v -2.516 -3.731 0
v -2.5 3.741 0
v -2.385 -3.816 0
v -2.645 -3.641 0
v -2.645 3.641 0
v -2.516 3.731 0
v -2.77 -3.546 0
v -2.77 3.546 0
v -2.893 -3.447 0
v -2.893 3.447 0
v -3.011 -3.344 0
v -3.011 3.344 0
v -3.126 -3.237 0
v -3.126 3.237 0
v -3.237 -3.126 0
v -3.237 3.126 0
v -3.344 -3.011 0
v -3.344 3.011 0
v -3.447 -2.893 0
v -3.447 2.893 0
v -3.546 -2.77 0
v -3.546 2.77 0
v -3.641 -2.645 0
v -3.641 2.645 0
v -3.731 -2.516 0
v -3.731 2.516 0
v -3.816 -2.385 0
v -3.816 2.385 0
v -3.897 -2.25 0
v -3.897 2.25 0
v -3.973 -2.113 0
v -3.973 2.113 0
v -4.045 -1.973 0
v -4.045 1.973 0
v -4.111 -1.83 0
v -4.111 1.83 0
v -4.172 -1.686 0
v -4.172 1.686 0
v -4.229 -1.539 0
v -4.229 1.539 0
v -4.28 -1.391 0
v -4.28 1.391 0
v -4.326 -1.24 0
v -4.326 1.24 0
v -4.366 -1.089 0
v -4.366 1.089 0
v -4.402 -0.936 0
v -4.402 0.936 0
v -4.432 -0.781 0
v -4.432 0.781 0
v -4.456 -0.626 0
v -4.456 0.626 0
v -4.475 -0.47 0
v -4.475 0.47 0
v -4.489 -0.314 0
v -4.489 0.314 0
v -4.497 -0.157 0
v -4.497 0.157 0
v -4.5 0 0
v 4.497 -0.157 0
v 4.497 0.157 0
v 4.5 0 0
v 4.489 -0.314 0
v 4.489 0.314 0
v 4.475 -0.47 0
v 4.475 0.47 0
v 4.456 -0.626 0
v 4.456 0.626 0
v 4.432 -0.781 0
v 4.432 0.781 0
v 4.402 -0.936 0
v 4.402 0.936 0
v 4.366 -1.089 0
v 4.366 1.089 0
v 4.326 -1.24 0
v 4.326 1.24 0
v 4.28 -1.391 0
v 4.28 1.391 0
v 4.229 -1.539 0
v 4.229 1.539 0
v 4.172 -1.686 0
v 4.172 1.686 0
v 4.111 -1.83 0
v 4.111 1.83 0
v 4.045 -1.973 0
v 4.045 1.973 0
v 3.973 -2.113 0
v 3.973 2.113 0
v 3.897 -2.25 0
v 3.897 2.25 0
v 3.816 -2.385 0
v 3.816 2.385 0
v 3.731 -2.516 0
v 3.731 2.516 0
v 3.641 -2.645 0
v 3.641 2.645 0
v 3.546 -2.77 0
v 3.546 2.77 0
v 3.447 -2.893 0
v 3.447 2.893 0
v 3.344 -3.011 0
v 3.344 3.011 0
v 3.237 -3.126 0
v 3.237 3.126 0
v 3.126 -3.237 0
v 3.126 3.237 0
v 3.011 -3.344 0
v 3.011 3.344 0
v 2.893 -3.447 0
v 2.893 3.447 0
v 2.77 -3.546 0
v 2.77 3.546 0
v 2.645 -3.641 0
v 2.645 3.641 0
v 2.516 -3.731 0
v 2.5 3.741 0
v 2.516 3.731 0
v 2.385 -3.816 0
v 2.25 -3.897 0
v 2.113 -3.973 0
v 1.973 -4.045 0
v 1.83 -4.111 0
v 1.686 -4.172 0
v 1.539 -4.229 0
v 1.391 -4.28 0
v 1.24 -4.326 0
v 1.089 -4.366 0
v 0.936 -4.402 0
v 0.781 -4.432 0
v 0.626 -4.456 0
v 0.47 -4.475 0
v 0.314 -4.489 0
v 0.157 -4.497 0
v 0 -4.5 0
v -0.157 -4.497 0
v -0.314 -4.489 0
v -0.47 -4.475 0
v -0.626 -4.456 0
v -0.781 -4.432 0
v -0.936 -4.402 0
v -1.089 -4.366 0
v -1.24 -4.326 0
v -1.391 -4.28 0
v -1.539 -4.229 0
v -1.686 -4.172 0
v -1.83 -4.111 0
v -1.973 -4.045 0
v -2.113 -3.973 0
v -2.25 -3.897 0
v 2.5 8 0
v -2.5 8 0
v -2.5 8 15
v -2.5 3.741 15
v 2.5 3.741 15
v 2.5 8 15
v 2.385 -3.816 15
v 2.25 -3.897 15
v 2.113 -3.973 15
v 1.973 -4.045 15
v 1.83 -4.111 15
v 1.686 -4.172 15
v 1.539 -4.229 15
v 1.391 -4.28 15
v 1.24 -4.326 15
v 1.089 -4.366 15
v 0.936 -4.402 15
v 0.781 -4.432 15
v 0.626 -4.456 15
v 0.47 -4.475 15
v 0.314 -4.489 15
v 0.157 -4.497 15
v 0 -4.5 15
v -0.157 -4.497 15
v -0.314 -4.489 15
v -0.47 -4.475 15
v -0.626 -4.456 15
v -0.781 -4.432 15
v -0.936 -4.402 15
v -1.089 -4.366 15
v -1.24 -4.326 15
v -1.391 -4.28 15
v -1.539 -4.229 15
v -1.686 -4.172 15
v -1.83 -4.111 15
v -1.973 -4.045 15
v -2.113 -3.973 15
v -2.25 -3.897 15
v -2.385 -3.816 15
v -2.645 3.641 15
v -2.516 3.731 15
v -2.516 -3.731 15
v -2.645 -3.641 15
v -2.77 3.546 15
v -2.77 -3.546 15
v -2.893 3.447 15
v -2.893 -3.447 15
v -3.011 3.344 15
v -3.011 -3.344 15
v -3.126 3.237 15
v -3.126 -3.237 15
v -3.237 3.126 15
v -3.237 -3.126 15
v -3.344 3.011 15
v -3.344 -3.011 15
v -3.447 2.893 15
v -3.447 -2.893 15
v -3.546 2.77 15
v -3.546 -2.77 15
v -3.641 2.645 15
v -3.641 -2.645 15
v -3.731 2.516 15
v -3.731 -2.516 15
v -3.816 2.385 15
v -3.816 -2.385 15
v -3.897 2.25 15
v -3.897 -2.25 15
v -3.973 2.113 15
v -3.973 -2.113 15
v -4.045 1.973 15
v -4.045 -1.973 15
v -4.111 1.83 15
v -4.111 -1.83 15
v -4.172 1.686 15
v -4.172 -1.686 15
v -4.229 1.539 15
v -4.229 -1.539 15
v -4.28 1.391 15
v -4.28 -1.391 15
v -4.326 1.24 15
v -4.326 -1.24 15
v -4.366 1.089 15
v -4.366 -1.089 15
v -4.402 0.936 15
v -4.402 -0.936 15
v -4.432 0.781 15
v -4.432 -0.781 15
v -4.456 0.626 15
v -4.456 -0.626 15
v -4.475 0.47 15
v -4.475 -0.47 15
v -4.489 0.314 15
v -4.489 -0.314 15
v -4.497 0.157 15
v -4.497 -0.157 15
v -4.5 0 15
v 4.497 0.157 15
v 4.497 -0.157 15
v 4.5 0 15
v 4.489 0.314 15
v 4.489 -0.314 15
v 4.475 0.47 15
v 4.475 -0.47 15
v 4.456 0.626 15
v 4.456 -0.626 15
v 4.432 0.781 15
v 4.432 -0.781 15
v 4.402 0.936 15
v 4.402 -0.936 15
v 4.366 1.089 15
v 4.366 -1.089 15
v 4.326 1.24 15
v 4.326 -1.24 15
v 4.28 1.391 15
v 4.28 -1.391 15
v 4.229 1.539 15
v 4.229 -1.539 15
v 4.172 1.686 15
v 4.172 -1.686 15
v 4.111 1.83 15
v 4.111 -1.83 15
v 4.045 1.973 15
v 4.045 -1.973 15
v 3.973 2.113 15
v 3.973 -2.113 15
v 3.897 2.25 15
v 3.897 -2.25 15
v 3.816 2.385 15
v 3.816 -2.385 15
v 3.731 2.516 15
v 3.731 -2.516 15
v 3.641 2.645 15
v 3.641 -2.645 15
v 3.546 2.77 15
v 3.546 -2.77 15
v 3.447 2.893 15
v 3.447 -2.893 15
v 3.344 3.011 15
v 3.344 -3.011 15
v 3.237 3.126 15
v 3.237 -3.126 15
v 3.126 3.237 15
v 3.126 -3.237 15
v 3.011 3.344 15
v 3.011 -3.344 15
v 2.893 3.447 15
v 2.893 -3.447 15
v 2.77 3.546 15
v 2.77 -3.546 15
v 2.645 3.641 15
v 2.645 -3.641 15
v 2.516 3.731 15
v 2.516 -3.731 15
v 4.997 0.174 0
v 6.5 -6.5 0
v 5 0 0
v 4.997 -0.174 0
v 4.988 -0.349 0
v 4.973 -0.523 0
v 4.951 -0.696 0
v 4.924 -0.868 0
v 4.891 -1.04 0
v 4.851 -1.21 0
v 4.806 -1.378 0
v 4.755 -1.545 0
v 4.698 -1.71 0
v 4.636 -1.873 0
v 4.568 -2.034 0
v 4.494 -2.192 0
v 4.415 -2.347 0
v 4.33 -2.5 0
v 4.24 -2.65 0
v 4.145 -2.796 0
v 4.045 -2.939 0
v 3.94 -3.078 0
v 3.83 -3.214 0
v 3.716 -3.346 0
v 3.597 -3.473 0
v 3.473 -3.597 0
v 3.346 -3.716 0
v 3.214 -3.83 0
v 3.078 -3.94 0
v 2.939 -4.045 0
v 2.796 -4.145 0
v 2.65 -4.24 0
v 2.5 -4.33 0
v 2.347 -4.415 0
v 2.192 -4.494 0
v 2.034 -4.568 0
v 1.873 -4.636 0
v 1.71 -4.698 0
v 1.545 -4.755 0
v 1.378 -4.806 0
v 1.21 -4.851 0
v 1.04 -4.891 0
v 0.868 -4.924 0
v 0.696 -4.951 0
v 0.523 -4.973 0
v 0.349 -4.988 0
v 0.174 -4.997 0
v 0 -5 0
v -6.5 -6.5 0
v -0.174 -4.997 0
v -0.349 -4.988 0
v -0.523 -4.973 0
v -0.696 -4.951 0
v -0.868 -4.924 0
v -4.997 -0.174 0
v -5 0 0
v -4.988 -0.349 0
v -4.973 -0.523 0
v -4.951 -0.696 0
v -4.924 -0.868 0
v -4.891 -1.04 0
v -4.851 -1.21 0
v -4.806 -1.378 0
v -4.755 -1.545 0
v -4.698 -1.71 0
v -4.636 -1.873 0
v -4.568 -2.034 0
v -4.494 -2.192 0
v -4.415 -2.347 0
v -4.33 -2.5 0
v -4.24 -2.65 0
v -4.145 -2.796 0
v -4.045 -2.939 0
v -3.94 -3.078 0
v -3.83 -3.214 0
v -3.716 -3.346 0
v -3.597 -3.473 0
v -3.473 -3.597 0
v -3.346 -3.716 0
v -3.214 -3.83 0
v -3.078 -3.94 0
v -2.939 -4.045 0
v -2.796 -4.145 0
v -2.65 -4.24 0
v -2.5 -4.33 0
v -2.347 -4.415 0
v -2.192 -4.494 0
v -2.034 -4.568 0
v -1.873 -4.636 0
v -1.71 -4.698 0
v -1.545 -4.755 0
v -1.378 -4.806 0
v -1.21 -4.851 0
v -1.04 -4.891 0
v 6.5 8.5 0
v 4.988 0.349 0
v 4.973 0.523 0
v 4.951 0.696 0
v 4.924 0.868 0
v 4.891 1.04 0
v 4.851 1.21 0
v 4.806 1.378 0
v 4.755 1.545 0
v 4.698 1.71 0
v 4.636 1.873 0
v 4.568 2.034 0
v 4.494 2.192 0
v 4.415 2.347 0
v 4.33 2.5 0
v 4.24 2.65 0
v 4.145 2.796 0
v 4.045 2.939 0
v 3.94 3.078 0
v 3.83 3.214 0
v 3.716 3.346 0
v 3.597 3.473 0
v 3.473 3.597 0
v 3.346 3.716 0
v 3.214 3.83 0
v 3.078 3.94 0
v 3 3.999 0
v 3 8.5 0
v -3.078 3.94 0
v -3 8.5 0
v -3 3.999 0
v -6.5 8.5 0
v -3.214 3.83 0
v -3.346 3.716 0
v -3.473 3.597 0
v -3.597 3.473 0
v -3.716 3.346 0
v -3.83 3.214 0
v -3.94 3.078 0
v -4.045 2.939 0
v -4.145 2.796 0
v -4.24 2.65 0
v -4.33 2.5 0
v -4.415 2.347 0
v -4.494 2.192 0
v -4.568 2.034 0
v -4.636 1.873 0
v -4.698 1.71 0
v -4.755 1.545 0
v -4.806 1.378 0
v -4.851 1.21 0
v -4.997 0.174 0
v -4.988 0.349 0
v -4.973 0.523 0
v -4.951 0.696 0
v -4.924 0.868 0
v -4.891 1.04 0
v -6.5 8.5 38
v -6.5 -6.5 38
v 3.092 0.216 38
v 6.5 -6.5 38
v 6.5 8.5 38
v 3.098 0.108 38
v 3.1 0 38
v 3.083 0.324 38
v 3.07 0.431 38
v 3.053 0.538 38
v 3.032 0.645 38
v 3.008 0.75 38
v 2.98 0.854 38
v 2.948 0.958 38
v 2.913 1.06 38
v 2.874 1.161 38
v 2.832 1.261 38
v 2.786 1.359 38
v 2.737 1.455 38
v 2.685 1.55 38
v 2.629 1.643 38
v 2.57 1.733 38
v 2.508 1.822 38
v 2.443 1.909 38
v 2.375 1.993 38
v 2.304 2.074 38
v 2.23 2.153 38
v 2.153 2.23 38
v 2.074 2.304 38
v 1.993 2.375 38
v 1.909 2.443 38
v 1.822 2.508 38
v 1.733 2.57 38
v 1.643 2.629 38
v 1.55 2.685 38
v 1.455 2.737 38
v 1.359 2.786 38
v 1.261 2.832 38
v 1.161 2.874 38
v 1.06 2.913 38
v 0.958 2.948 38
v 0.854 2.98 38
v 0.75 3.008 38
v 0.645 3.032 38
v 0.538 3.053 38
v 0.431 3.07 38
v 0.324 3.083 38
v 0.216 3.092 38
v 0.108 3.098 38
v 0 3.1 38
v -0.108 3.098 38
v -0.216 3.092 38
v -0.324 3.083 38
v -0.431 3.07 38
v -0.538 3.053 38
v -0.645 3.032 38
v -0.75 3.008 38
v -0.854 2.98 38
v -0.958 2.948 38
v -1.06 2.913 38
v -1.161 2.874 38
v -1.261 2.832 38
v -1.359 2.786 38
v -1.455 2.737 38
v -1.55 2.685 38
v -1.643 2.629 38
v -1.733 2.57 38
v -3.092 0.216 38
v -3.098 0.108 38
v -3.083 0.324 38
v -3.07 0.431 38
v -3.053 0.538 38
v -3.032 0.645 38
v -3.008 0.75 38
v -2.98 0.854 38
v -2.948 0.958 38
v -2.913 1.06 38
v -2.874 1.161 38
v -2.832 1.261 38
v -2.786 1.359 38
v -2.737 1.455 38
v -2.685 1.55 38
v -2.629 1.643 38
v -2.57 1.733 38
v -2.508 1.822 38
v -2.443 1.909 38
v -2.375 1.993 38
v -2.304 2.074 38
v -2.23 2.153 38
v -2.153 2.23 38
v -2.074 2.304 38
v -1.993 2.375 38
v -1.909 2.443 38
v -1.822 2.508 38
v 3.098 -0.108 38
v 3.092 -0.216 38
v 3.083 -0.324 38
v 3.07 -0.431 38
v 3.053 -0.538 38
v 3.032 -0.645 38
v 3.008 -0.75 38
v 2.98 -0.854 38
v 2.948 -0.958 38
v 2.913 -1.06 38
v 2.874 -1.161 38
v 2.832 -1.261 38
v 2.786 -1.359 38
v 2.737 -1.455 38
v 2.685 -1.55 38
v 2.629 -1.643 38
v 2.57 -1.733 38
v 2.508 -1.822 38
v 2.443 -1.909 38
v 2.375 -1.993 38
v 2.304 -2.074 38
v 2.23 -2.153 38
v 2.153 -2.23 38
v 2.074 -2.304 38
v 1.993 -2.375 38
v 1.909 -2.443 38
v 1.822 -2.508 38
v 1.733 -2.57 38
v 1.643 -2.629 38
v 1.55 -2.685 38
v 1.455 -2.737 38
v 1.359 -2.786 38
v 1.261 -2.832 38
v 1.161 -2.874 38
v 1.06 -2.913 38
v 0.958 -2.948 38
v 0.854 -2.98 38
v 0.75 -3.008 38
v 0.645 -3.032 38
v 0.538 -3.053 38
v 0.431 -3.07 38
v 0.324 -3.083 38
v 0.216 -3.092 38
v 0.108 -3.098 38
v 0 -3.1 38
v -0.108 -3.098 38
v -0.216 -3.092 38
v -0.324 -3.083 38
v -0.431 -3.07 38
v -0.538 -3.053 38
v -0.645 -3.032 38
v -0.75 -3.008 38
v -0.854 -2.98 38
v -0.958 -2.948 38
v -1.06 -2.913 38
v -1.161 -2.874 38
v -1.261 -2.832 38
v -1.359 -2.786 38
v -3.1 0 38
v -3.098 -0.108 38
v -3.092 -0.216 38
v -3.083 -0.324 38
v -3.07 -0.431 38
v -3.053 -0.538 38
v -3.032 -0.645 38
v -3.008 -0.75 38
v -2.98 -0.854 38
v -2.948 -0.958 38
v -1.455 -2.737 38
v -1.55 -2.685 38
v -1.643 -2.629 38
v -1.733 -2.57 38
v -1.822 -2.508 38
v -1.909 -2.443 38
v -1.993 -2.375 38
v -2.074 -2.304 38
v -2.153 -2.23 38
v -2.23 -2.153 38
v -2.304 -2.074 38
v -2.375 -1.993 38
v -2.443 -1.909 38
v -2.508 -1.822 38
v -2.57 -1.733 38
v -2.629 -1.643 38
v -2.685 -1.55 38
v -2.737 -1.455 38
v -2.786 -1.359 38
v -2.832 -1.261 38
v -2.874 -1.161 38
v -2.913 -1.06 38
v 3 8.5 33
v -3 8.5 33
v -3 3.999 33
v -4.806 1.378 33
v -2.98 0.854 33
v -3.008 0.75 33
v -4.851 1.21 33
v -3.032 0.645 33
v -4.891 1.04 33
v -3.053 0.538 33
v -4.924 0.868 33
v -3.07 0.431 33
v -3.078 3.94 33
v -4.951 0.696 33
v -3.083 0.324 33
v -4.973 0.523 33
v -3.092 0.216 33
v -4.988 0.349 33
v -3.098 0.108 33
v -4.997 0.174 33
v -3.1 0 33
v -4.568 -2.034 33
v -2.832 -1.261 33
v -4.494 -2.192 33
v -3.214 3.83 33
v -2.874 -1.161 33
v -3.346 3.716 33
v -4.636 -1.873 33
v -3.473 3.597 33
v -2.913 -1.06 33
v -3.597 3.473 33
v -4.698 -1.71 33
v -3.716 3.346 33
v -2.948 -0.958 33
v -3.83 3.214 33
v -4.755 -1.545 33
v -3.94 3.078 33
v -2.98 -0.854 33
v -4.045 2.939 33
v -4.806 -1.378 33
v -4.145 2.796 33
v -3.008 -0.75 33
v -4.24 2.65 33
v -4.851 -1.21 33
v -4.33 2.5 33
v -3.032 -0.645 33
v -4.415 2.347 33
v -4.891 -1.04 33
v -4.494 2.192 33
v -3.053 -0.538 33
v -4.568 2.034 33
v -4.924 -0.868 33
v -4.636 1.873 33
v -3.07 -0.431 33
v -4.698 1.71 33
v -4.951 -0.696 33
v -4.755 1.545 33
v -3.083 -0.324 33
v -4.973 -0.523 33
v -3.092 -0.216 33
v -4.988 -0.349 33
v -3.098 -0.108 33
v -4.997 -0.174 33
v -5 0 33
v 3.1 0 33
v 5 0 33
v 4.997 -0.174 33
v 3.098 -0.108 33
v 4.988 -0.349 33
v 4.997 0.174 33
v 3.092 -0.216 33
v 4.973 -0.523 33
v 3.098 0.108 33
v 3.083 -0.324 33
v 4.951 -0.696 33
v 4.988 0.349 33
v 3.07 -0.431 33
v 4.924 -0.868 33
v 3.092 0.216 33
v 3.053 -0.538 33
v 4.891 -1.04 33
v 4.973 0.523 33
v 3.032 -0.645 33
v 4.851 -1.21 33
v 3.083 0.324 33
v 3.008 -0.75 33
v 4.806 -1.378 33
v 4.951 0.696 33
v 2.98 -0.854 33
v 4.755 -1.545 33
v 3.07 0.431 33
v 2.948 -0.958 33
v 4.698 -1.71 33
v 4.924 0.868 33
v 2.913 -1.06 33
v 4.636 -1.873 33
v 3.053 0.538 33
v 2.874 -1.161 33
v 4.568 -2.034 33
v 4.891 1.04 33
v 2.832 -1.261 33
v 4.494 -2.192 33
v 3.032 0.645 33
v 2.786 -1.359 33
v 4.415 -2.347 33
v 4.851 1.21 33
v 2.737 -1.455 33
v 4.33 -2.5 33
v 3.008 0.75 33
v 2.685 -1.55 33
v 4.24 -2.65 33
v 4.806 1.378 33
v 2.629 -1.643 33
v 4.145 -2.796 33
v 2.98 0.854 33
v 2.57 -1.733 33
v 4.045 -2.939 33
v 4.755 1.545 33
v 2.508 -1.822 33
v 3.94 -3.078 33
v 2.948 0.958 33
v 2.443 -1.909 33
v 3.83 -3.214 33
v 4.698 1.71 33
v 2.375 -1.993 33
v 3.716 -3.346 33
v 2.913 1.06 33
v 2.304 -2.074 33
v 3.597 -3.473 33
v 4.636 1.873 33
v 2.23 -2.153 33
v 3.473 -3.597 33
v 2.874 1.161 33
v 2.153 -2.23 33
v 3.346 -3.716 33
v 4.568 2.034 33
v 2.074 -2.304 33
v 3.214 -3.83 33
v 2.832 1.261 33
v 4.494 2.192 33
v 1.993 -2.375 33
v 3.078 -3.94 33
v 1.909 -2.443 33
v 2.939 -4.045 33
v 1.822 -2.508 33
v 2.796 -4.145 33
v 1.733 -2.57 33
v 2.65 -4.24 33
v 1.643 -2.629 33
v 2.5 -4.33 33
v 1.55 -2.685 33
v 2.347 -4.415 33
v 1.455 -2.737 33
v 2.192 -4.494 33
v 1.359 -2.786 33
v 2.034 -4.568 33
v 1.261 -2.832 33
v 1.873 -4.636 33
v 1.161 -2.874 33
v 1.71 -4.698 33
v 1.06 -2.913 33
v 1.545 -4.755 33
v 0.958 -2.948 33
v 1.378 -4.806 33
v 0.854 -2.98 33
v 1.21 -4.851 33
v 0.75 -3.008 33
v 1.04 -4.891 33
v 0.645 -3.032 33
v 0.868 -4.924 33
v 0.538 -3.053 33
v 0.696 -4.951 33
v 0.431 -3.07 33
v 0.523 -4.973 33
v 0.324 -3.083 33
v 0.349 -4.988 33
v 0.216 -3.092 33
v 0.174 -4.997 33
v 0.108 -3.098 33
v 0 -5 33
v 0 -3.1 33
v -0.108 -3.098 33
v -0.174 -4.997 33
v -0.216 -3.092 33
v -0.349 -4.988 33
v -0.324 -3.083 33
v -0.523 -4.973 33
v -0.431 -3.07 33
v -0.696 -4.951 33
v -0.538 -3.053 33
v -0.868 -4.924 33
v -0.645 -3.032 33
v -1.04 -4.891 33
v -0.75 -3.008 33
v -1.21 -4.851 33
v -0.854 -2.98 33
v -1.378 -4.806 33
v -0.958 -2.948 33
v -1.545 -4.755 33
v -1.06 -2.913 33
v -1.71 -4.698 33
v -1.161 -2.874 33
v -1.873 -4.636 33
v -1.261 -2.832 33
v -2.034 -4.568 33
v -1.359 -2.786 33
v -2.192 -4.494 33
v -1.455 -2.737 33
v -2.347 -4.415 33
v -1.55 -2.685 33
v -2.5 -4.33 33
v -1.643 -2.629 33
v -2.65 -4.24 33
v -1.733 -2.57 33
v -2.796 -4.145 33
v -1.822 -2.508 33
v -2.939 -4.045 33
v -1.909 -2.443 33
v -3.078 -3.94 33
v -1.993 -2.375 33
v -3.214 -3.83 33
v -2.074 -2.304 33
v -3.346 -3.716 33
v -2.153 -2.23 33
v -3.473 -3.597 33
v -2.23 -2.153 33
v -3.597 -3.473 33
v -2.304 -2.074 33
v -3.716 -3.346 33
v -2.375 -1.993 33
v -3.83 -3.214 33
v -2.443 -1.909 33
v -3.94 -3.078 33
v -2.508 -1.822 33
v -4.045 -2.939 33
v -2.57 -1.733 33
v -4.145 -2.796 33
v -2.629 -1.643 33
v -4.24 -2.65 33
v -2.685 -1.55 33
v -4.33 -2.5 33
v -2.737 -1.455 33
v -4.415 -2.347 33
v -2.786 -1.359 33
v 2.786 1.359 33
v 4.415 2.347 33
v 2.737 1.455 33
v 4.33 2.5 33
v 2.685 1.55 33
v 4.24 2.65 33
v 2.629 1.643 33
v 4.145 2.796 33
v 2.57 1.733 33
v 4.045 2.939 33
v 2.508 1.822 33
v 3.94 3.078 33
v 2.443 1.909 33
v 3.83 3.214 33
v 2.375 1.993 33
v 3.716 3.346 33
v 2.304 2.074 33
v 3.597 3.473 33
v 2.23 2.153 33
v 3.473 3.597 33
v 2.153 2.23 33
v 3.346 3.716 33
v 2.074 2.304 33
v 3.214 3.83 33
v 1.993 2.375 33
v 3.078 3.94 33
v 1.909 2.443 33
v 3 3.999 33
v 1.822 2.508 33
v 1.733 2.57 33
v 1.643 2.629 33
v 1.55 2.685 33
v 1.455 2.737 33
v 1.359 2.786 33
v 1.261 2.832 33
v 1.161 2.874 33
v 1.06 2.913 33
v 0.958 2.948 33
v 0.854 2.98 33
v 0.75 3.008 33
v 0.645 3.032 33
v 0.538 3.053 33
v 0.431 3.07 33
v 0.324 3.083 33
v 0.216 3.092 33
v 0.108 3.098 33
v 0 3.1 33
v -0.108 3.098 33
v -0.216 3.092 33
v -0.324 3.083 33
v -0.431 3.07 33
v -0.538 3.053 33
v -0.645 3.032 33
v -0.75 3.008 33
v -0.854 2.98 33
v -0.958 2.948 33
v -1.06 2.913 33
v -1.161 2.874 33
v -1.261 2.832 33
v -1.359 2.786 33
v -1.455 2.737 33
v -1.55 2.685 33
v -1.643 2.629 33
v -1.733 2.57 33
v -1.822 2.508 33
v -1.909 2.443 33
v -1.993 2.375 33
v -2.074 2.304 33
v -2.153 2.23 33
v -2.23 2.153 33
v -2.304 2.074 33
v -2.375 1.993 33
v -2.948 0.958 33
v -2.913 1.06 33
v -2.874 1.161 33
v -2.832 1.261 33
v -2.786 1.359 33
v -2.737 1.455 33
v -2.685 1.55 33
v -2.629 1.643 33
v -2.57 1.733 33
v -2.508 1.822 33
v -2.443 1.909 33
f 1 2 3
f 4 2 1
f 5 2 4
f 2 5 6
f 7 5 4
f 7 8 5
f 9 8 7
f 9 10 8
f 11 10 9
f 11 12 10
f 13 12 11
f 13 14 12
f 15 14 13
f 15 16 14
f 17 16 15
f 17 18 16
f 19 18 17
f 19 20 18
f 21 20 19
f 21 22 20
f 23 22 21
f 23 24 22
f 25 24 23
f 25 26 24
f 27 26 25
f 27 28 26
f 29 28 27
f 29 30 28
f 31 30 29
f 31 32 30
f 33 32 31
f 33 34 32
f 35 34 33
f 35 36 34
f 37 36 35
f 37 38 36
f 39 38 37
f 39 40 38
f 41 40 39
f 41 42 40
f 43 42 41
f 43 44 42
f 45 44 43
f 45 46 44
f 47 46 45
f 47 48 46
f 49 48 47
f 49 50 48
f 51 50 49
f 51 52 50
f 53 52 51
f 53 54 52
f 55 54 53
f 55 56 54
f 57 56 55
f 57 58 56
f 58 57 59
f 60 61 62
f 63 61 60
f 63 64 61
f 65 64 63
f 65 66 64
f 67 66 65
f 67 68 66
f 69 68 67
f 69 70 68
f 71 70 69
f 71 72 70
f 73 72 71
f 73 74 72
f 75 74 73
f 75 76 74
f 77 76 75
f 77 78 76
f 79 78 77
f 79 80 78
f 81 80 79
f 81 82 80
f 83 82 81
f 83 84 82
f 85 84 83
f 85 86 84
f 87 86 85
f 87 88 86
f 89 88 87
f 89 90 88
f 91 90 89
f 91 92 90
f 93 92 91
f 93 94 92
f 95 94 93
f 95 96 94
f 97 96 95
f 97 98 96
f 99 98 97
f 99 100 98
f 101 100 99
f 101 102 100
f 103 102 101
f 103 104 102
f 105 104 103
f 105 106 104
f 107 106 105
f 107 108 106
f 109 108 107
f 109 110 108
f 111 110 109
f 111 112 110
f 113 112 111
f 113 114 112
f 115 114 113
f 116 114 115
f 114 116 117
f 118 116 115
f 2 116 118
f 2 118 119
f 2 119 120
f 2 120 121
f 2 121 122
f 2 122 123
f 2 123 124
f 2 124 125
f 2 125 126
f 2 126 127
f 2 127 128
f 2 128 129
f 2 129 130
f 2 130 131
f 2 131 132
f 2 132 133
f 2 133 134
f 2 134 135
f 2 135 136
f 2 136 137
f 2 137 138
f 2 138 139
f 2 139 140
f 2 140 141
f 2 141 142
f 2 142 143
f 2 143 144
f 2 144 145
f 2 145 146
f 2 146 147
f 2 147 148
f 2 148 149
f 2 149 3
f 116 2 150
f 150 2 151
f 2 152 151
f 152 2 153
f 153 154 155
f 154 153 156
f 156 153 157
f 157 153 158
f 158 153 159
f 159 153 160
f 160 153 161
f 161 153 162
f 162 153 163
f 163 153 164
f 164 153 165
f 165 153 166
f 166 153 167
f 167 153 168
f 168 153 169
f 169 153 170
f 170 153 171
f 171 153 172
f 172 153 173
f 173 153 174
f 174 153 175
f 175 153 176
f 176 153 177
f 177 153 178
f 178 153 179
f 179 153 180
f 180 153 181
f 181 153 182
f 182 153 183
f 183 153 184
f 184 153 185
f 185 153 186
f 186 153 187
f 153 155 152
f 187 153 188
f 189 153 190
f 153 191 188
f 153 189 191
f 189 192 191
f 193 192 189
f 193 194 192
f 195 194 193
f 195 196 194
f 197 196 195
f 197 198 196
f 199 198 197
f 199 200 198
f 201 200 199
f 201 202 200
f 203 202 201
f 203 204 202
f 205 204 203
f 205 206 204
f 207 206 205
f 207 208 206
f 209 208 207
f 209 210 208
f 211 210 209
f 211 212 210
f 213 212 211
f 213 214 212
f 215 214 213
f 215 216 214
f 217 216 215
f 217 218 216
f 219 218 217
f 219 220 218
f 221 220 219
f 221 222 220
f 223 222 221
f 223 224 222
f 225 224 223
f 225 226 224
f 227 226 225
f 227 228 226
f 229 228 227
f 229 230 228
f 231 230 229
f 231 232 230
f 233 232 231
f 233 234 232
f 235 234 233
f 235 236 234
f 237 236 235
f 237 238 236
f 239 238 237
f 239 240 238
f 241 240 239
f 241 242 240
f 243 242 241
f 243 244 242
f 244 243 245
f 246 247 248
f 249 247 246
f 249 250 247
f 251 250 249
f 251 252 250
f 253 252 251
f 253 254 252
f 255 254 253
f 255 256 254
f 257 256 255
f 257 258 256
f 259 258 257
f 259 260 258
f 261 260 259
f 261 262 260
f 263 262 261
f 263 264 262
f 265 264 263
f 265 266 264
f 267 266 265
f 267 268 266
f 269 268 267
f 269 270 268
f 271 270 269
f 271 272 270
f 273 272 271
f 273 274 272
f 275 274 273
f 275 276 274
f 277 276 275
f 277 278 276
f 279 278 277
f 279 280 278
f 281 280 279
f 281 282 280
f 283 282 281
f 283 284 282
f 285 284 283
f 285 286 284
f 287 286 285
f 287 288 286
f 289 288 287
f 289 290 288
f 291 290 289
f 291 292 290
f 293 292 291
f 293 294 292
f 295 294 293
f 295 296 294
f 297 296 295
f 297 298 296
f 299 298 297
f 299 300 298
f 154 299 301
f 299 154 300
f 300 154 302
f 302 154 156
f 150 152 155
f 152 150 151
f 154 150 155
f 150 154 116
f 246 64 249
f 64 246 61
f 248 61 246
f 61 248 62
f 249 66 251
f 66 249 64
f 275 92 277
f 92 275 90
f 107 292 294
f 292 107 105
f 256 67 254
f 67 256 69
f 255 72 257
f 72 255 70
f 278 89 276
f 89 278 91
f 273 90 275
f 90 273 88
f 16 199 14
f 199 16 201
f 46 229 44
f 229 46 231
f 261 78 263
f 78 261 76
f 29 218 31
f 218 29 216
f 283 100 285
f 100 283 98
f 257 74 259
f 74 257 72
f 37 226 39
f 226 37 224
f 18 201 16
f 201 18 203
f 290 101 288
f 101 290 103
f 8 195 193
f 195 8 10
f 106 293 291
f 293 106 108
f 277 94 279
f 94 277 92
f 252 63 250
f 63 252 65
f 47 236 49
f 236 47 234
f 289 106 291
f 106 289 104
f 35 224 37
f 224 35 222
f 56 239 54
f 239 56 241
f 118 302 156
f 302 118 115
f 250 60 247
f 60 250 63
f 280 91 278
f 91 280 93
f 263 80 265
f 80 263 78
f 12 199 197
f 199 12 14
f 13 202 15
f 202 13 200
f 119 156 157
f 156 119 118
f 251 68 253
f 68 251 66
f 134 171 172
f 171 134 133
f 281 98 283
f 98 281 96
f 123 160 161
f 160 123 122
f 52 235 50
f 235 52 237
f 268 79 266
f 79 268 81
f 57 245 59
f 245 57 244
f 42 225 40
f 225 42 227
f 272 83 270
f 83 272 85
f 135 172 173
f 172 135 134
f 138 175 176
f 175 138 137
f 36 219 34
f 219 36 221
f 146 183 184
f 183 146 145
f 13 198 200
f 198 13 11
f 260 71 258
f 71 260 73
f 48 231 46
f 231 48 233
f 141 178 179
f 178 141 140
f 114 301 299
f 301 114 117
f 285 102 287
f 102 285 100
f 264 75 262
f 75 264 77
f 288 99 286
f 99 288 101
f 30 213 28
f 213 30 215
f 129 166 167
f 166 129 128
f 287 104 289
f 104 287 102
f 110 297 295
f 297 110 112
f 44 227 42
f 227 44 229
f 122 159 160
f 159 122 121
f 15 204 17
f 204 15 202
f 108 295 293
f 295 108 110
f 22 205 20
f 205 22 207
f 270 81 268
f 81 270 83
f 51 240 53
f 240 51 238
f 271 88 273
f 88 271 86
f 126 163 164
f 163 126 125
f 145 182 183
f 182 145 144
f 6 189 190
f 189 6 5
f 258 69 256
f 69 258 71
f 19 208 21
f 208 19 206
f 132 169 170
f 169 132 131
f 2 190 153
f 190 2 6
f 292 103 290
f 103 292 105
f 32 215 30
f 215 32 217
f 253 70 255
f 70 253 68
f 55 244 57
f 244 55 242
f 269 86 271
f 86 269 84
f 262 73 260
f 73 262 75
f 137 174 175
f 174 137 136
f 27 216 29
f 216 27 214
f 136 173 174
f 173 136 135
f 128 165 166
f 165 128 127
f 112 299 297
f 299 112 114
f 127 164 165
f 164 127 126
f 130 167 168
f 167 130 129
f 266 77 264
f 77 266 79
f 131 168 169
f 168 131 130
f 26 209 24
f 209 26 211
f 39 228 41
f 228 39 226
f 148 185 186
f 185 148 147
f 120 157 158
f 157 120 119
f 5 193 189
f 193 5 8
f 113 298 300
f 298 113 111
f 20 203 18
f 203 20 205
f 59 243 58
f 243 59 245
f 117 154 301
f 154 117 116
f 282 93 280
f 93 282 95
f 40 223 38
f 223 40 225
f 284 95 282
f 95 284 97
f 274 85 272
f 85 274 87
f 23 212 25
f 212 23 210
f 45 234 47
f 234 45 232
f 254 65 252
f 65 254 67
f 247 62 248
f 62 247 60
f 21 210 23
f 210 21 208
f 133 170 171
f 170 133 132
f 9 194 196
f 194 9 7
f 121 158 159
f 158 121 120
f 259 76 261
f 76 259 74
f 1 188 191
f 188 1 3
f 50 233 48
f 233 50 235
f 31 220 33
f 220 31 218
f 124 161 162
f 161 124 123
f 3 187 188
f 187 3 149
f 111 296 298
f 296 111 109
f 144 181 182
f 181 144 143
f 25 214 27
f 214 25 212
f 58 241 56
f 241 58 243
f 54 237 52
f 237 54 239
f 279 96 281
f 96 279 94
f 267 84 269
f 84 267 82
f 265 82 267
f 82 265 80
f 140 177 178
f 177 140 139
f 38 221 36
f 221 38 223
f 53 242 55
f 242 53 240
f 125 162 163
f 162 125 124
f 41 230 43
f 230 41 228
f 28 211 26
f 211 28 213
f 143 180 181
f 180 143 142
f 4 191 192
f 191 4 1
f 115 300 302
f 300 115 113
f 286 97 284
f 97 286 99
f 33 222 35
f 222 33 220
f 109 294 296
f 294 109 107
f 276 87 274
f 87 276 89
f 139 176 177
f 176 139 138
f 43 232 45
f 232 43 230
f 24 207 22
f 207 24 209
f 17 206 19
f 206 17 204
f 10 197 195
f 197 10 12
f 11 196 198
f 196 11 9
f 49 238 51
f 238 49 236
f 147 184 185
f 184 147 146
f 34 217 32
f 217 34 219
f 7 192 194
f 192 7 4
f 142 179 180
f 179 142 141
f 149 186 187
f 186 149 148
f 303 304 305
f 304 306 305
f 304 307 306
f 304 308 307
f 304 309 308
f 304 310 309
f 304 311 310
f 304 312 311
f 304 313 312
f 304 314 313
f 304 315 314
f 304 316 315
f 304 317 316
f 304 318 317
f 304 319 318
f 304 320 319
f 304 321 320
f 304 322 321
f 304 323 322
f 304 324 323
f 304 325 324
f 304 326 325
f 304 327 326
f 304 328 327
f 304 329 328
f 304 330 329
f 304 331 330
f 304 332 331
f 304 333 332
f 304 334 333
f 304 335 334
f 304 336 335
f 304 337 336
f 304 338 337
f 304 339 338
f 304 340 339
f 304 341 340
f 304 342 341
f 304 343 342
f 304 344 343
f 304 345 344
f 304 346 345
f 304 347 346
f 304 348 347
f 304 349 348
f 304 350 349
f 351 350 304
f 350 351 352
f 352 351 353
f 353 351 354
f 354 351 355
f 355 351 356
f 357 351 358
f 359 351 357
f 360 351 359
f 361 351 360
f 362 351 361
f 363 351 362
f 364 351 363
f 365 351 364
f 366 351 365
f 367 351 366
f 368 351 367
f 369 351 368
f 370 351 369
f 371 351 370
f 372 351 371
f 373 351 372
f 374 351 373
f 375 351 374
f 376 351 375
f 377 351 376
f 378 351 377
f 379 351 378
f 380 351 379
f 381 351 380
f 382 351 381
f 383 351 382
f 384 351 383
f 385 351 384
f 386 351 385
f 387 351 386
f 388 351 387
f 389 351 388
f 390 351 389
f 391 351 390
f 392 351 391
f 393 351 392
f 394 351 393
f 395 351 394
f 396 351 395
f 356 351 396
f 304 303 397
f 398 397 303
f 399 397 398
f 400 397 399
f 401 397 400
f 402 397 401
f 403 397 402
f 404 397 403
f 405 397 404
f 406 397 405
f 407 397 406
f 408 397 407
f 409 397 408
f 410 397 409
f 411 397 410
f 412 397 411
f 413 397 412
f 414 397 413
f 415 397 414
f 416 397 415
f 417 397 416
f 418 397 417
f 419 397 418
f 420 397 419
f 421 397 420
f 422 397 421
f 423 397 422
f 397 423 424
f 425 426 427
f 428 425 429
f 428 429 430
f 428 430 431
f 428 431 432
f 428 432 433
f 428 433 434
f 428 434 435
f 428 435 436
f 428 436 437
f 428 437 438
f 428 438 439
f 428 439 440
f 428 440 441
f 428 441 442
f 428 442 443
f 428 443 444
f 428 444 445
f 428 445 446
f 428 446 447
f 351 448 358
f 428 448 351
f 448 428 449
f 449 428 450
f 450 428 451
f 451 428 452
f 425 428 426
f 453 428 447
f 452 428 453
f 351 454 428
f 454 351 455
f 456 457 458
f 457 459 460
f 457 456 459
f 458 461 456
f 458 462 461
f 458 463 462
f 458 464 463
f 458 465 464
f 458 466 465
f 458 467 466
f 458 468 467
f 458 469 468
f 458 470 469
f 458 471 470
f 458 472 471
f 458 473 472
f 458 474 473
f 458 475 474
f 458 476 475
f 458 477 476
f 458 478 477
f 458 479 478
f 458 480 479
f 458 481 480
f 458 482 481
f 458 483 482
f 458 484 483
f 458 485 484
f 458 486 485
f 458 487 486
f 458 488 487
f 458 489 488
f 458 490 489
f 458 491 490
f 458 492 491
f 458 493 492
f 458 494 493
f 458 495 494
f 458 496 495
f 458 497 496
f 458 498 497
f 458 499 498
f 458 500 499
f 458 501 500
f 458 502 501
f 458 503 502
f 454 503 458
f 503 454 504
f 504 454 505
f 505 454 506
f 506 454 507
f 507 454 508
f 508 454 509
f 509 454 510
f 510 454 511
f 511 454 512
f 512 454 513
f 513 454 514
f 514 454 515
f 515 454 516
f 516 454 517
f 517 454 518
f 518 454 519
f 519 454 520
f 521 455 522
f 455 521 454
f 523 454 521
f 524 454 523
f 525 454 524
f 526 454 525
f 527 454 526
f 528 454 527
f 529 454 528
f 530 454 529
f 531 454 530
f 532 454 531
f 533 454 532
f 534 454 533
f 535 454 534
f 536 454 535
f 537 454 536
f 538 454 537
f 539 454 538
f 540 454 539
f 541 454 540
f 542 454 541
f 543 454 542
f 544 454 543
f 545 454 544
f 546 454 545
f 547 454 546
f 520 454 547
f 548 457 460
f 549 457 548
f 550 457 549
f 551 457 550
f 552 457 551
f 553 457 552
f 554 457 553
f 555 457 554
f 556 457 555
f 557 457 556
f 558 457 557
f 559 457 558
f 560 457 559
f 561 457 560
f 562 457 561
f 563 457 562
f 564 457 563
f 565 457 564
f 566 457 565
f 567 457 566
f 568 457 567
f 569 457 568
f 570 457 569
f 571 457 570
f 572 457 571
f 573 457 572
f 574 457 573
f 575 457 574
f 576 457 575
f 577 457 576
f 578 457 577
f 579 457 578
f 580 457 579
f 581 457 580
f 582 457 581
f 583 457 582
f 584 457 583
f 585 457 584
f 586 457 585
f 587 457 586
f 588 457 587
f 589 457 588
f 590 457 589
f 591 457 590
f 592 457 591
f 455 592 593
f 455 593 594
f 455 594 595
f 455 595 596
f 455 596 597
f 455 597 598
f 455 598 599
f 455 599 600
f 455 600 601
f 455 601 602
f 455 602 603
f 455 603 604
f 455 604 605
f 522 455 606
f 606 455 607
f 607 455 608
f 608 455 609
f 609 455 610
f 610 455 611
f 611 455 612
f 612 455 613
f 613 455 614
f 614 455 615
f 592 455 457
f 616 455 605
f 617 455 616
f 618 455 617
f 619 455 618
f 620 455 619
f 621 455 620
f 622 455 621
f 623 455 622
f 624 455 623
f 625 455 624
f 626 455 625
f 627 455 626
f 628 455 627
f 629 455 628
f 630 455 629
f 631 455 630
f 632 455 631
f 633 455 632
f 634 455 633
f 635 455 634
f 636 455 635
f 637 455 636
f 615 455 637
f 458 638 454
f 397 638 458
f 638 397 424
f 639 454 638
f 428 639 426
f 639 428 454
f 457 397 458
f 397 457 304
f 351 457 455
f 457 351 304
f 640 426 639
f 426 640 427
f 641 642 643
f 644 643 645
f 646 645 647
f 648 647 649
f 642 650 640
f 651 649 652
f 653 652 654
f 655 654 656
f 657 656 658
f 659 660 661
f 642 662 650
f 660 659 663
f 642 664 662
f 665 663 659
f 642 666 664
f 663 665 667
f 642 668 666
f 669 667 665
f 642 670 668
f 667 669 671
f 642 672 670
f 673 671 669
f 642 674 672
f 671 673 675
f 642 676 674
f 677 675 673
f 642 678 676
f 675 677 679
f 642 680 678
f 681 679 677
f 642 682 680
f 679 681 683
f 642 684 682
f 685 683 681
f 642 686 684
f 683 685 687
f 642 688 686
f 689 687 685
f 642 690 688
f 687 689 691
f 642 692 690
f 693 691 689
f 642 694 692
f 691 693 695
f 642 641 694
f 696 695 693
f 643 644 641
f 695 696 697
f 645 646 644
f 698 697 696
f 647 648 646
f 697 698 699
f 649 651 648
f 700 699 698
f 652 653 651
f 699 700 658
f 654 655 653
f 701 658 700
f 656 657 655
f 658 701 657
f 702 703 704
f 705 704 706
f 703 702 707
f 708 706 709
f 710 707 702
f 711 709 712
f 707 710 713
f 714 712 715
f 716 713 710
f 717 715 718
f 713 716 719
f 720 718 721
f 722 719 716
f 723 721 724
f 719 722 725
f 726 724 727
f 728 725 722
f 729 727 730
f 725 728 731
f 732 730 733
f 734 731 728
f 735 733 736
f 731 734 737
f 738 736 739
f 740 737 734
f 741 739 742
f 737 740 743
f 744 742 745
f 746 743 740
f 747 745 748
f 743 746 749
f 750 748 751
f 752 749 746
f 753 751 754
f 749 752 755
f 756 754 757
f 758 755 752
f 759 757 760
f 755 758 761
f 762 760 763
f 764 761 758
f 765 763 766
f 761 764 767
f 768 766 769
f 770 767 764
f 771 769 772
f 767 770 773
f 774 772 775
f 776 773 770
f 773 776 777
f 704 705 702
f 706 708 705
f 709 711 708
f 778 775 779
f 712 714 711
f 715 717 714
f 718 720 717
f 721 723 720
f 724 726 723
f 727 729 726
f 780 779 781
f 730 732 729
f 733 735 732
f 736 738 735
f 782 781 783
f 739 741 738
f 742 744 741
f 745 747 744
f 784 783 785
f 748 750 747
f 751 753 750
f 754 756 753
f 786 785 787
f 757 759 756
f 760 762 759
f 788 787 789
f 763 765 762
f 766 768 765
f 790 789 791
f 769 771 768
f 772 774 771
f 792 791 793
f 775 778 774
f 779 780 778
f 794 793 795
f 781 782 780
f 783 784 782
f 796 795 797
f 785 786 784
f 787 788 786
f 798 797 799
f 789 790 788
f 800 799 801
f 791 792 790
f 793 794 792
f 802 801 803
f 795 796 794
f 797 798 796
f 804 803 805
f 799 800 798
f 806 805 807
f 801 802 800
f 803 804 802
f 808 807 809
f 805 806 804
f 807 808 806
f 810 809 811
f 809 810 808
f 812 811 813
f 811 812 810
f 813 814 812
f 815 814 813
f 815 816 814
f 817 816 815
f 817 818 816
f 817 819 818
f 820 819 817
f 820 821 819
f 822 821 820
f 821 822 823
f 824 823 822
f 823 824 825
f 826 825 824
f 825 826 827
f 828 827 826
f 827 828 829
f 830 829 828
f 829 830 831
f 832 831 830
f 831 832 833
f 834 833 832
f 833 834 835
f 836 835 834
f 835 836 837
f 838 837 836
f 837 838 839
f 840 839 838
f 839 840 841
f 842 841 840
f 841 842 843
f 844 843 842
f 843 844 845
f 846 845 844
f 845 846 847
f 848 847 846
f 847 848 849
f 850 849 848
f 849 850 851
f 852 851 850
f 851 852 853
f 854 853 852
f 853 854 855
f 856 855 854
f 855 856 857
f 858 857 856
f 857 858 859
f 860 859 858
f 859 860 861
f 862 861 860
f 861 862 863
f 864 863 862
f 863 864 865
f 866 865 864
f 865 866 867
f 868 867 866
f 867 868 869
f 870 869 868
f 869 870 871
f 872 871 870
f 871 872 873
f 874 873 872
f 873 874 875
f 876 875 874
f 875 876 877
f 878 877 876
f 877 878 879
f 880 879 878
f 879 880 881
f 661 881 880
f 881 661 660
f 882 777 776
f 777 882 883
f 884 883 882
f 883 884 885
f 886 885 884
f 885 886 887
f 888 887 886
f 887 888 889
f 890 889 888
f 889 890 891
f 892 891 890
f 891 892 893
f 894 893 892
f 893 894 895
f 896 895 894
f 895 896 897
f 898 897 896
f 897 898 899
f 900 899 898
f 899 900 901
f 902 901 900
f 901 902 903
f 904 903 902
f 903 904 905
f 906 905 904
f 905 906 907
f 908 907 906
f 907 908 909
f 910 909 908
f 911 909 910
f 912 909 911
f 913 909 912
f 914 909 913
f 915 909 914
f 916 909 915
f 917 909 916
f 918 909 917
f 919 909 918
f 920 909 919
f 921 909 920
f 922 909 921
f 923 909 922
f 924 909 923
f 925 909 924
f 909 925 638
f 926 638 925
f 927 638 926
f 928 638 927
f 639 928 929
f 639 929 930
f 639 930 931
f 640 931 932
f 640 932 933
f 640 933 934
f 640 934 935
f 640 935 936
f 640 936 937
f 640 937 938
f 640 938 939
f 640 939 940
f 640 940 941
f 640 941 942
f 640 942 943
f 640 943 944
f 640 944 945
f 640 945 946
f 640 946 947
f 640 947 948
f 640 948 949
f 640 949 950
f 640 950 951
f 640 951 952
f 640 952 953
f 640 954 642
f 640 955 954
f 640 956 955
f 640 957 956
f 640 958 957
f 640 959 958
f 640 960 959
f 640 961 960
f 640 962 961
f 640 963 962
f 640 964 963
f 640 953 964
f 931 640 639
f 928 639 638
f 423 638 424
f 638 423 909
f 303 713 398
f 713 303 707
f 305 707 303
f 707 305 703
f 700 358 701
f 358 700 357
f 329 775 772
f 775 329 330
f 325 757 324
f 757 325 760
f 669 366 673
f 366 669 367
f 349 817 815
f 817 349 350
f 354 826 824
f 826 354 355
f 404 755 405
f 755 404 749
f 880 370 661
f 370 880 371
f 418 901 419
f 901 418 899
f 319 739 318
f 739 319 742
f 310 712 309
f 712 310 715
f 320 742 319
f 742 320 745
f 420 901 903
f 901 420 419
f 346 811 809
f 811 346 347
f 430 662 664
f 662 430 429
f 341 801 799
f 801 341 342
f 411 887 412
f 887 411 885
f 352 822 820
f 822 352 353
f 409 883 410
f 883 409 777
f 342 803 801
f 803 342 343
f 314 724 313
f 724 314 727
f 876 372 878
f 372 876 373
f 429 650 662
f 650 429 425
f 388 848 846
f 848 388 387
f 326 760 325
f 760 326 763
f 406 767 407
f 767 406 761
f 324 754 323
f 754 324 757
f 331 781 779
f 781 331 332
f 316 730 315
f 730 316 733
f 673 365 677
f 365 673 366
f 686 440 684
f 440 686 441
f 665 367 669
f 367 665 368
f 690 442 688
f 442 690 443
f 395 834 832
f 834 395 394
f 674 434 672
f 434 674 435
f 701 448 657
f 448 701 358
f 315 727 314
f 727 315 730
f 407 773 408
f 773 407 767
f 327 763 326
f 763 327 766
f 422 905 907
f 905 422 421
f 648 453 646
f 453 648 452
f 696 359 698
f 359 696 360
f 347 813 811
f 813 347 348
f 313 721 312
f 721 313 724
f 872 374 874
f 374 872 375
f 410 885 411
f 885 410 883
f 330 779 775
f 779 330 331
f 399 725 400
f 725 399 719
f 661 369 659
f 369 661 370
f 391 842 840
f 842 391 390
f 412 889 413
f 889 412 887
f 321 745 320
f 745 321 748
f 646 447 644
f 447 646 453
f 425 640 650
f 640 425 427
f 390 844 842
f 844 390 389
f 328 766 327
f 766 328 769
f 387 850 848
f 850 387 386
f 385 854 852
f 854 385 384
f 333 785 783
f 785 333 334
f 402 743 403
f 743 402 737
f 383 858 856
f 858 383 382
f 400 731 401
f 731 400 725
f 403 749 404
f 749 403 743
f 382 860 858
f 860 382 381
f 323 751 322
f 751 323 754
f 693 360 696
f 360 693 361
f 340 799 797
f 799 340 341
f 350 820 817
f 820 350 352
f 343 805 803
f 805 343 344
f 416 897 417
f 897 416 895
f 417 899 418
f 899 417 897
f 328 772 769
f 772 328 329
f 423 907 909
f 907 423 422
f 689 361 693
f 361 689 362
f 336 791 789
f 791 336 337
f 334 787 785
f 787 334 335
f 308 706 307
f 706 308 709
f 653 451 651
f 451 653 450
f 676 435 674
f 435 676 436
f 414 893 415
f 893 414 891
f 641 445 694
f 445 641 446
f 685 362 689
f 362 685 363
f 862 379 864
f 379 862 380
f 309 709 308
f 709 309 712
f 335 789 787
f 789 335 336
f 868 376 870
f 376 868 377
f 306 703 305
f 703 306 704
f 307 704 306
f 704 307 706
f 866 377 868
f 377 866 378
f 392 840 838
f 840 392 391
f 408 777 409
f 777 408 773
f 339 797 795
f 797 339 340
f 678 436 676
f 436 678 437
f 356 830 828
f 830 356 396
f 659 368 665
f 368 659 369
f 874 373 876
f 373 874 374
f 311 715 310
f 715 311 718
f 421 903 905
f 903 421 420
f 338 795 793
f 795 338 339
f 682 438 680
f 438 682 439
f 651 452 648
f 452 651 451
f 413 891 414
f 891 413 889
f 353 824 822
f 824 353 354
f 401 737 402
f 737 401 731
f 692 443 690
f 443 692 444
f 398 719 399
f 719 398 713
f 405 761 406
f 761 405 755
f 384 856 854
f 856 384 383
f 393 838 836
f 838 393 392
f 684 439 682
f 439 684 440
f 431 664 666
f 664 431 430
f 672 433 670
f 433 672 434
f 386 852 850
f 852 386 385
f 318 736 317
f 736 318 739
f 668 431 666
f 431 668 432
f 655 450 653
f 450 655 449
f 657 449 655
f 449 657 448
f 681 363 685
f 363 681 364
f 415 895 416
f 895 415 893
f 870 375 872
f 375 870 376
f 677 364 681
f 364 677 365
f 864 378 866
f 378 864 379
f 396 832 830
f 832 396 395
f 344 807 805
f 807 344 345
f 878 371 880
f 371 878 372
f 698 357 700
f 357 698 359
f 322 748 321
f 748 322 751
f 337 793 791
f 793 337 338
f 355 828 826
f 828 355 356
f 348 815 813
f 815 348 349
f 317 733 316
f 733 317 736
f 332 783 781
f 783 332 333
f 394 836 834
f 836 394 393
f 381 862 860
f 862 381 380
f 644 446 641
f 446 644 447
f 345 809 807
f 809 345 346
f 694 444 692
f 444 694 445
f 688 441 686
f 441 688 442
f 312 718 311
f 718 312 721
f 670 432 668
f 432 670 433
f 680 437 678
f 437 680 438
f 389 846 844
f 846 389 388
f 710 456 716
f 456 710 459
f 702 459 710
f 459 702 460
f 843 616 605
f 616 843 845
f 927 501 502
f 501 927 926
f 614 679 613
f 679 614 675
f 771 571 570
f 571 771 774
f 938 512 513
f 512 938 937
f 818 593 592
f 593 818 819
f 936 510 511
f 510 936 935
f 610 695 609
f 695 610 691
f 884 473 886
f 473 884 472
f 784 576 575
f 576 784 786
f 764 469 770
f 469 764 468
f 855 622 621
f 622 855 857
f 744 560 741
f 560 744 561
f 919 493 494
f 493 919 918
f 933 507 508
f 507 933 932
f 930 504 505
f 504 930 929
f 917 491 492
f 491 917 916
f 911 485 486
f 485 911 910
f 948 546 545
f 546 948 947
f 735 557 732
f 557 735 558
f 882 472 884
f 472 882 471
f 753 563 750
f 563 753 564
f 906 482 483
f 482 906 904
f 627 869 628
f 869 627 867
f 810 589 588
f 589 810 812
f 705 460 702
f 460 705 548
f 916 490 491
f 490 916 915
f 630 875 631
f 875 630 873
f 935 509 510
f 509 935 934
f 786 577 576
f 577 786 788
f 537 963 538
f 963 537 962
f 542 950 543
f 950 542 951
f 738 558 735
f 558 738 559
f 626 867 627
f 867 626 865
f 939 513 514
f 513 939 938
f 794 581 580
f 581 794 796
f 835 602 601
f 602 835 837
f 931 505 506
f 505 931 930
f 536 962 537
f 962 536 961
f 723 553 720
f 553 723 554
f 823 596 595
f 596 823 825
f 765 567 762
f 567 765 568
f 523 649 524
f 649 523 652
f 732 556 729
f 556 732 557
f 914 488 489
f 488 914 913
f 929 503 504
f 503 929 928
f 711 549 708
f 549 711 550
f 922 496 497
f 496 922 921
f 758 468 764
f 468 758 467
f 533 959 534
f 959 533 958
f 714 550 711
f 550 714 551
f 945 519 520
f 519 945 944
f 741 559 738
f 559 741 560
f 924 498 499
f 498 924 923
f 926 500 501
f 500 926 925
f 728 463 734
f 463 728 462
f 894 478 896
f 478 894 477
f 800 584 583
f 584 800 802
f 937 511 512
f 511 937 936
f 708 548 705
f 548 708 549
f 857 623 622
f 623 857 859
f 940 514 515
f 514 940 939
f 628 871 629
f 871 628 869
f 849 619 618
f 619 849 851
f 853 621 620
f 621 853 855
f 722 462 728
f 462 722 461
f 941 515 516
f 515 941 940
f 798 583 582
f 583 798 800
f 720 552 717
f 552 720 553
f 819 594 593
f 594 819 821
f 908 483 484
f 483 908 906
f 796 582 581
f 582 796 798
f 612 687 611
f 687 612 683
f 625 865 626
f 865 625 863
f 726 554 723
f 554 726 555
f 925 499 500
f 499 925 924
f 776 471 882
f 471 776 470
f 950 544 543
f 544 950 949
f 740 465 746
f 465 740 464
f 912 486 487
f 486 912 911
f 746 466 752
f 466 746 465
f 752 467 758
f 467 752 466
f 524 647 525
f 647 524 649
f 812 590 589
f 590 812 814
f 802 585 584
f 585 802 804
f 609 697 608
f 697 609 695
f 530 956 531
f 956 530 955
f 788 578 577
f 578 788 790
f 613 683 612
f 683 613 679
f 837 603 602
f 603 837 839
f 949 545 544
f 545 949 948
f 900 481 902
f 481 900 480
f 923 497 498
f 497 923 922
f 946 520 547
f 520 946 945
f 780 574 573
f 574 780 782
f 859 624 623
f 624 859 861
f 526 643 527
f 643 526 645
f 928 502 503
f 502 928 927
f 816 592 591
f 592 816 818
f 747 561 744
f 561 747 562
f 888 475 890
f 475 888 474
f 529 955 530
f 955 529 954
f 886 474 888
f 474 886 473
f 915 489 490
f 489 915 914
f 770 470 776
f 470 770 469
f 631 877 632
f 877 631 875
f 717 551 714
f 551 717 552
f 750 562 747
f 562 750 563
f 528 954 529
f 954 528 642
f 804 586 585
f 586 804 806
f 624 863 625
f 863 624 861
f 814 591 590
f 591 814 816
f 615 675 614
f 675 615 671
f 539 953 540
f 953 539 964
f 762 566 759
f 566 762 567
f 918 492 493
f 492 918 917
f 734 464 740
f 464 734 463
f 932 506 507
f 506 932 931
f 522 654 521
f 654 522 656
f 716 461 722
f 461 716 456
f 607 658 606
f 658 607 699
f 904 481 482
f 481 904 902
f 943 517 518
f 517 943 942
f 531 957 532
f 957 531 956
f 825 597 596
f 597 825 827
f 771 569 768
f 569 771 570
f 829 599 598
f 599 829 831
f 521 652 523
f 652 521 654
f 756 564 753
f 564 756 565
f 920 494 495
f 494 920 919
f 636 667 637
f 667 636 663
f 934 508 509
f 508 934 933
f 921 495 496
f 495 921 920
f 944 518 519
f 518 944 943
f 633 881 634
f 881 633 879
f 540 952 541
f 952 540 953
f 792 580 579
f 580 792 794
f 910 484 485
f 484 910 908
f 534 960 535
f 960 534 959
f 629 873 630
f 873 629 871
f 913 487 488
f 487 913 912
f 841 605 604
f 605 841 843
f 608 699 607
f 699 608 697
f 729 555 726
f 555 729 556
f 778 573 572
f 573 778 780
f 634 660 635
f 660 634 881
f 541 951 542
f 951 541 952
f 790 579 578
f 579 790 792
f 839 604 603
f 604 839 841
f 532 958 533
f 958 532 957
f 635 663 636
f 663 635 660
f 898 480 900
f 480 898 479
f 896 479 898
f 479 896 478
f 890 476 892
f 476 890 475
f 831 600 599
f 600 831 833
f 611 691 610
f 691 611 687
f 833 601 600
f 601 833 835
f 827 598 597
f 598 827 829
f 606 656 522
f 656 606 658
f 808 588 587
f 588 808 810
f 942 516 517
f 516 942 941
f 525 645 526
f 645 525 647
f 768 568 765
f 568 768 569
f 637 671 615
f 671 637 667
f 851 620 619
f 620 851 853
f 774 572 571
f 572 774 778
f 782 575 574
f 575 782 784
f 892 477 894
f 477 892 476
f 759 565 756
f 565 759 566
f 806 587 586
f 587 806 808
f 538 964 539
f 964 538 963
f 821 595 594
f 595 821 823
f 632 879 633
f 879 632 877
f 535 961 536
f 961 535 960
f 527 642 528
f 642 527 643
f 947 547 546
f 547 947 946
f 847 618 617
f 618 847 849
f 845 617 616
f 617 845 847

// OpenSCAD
$fn=180;

o=0.2;

module keyhole(){
difference(){
    translate([0,1]) linear_extrude(38) square([9+4,15], center=true);
    translate([0,10,-1]) linear_extrude(34) square([6,15], center=true);
    translate([0,0,-1]) cylinder(d=10,h=34);
    cylinder(d=6+o,h=100,center=true);
}
}

module key(){
 translate([0,3]) linear_extrude(15) square([5,10], center=true);
 translate([0,0]) cylinder(d=9,h=15);
}

key();
keyhole();
